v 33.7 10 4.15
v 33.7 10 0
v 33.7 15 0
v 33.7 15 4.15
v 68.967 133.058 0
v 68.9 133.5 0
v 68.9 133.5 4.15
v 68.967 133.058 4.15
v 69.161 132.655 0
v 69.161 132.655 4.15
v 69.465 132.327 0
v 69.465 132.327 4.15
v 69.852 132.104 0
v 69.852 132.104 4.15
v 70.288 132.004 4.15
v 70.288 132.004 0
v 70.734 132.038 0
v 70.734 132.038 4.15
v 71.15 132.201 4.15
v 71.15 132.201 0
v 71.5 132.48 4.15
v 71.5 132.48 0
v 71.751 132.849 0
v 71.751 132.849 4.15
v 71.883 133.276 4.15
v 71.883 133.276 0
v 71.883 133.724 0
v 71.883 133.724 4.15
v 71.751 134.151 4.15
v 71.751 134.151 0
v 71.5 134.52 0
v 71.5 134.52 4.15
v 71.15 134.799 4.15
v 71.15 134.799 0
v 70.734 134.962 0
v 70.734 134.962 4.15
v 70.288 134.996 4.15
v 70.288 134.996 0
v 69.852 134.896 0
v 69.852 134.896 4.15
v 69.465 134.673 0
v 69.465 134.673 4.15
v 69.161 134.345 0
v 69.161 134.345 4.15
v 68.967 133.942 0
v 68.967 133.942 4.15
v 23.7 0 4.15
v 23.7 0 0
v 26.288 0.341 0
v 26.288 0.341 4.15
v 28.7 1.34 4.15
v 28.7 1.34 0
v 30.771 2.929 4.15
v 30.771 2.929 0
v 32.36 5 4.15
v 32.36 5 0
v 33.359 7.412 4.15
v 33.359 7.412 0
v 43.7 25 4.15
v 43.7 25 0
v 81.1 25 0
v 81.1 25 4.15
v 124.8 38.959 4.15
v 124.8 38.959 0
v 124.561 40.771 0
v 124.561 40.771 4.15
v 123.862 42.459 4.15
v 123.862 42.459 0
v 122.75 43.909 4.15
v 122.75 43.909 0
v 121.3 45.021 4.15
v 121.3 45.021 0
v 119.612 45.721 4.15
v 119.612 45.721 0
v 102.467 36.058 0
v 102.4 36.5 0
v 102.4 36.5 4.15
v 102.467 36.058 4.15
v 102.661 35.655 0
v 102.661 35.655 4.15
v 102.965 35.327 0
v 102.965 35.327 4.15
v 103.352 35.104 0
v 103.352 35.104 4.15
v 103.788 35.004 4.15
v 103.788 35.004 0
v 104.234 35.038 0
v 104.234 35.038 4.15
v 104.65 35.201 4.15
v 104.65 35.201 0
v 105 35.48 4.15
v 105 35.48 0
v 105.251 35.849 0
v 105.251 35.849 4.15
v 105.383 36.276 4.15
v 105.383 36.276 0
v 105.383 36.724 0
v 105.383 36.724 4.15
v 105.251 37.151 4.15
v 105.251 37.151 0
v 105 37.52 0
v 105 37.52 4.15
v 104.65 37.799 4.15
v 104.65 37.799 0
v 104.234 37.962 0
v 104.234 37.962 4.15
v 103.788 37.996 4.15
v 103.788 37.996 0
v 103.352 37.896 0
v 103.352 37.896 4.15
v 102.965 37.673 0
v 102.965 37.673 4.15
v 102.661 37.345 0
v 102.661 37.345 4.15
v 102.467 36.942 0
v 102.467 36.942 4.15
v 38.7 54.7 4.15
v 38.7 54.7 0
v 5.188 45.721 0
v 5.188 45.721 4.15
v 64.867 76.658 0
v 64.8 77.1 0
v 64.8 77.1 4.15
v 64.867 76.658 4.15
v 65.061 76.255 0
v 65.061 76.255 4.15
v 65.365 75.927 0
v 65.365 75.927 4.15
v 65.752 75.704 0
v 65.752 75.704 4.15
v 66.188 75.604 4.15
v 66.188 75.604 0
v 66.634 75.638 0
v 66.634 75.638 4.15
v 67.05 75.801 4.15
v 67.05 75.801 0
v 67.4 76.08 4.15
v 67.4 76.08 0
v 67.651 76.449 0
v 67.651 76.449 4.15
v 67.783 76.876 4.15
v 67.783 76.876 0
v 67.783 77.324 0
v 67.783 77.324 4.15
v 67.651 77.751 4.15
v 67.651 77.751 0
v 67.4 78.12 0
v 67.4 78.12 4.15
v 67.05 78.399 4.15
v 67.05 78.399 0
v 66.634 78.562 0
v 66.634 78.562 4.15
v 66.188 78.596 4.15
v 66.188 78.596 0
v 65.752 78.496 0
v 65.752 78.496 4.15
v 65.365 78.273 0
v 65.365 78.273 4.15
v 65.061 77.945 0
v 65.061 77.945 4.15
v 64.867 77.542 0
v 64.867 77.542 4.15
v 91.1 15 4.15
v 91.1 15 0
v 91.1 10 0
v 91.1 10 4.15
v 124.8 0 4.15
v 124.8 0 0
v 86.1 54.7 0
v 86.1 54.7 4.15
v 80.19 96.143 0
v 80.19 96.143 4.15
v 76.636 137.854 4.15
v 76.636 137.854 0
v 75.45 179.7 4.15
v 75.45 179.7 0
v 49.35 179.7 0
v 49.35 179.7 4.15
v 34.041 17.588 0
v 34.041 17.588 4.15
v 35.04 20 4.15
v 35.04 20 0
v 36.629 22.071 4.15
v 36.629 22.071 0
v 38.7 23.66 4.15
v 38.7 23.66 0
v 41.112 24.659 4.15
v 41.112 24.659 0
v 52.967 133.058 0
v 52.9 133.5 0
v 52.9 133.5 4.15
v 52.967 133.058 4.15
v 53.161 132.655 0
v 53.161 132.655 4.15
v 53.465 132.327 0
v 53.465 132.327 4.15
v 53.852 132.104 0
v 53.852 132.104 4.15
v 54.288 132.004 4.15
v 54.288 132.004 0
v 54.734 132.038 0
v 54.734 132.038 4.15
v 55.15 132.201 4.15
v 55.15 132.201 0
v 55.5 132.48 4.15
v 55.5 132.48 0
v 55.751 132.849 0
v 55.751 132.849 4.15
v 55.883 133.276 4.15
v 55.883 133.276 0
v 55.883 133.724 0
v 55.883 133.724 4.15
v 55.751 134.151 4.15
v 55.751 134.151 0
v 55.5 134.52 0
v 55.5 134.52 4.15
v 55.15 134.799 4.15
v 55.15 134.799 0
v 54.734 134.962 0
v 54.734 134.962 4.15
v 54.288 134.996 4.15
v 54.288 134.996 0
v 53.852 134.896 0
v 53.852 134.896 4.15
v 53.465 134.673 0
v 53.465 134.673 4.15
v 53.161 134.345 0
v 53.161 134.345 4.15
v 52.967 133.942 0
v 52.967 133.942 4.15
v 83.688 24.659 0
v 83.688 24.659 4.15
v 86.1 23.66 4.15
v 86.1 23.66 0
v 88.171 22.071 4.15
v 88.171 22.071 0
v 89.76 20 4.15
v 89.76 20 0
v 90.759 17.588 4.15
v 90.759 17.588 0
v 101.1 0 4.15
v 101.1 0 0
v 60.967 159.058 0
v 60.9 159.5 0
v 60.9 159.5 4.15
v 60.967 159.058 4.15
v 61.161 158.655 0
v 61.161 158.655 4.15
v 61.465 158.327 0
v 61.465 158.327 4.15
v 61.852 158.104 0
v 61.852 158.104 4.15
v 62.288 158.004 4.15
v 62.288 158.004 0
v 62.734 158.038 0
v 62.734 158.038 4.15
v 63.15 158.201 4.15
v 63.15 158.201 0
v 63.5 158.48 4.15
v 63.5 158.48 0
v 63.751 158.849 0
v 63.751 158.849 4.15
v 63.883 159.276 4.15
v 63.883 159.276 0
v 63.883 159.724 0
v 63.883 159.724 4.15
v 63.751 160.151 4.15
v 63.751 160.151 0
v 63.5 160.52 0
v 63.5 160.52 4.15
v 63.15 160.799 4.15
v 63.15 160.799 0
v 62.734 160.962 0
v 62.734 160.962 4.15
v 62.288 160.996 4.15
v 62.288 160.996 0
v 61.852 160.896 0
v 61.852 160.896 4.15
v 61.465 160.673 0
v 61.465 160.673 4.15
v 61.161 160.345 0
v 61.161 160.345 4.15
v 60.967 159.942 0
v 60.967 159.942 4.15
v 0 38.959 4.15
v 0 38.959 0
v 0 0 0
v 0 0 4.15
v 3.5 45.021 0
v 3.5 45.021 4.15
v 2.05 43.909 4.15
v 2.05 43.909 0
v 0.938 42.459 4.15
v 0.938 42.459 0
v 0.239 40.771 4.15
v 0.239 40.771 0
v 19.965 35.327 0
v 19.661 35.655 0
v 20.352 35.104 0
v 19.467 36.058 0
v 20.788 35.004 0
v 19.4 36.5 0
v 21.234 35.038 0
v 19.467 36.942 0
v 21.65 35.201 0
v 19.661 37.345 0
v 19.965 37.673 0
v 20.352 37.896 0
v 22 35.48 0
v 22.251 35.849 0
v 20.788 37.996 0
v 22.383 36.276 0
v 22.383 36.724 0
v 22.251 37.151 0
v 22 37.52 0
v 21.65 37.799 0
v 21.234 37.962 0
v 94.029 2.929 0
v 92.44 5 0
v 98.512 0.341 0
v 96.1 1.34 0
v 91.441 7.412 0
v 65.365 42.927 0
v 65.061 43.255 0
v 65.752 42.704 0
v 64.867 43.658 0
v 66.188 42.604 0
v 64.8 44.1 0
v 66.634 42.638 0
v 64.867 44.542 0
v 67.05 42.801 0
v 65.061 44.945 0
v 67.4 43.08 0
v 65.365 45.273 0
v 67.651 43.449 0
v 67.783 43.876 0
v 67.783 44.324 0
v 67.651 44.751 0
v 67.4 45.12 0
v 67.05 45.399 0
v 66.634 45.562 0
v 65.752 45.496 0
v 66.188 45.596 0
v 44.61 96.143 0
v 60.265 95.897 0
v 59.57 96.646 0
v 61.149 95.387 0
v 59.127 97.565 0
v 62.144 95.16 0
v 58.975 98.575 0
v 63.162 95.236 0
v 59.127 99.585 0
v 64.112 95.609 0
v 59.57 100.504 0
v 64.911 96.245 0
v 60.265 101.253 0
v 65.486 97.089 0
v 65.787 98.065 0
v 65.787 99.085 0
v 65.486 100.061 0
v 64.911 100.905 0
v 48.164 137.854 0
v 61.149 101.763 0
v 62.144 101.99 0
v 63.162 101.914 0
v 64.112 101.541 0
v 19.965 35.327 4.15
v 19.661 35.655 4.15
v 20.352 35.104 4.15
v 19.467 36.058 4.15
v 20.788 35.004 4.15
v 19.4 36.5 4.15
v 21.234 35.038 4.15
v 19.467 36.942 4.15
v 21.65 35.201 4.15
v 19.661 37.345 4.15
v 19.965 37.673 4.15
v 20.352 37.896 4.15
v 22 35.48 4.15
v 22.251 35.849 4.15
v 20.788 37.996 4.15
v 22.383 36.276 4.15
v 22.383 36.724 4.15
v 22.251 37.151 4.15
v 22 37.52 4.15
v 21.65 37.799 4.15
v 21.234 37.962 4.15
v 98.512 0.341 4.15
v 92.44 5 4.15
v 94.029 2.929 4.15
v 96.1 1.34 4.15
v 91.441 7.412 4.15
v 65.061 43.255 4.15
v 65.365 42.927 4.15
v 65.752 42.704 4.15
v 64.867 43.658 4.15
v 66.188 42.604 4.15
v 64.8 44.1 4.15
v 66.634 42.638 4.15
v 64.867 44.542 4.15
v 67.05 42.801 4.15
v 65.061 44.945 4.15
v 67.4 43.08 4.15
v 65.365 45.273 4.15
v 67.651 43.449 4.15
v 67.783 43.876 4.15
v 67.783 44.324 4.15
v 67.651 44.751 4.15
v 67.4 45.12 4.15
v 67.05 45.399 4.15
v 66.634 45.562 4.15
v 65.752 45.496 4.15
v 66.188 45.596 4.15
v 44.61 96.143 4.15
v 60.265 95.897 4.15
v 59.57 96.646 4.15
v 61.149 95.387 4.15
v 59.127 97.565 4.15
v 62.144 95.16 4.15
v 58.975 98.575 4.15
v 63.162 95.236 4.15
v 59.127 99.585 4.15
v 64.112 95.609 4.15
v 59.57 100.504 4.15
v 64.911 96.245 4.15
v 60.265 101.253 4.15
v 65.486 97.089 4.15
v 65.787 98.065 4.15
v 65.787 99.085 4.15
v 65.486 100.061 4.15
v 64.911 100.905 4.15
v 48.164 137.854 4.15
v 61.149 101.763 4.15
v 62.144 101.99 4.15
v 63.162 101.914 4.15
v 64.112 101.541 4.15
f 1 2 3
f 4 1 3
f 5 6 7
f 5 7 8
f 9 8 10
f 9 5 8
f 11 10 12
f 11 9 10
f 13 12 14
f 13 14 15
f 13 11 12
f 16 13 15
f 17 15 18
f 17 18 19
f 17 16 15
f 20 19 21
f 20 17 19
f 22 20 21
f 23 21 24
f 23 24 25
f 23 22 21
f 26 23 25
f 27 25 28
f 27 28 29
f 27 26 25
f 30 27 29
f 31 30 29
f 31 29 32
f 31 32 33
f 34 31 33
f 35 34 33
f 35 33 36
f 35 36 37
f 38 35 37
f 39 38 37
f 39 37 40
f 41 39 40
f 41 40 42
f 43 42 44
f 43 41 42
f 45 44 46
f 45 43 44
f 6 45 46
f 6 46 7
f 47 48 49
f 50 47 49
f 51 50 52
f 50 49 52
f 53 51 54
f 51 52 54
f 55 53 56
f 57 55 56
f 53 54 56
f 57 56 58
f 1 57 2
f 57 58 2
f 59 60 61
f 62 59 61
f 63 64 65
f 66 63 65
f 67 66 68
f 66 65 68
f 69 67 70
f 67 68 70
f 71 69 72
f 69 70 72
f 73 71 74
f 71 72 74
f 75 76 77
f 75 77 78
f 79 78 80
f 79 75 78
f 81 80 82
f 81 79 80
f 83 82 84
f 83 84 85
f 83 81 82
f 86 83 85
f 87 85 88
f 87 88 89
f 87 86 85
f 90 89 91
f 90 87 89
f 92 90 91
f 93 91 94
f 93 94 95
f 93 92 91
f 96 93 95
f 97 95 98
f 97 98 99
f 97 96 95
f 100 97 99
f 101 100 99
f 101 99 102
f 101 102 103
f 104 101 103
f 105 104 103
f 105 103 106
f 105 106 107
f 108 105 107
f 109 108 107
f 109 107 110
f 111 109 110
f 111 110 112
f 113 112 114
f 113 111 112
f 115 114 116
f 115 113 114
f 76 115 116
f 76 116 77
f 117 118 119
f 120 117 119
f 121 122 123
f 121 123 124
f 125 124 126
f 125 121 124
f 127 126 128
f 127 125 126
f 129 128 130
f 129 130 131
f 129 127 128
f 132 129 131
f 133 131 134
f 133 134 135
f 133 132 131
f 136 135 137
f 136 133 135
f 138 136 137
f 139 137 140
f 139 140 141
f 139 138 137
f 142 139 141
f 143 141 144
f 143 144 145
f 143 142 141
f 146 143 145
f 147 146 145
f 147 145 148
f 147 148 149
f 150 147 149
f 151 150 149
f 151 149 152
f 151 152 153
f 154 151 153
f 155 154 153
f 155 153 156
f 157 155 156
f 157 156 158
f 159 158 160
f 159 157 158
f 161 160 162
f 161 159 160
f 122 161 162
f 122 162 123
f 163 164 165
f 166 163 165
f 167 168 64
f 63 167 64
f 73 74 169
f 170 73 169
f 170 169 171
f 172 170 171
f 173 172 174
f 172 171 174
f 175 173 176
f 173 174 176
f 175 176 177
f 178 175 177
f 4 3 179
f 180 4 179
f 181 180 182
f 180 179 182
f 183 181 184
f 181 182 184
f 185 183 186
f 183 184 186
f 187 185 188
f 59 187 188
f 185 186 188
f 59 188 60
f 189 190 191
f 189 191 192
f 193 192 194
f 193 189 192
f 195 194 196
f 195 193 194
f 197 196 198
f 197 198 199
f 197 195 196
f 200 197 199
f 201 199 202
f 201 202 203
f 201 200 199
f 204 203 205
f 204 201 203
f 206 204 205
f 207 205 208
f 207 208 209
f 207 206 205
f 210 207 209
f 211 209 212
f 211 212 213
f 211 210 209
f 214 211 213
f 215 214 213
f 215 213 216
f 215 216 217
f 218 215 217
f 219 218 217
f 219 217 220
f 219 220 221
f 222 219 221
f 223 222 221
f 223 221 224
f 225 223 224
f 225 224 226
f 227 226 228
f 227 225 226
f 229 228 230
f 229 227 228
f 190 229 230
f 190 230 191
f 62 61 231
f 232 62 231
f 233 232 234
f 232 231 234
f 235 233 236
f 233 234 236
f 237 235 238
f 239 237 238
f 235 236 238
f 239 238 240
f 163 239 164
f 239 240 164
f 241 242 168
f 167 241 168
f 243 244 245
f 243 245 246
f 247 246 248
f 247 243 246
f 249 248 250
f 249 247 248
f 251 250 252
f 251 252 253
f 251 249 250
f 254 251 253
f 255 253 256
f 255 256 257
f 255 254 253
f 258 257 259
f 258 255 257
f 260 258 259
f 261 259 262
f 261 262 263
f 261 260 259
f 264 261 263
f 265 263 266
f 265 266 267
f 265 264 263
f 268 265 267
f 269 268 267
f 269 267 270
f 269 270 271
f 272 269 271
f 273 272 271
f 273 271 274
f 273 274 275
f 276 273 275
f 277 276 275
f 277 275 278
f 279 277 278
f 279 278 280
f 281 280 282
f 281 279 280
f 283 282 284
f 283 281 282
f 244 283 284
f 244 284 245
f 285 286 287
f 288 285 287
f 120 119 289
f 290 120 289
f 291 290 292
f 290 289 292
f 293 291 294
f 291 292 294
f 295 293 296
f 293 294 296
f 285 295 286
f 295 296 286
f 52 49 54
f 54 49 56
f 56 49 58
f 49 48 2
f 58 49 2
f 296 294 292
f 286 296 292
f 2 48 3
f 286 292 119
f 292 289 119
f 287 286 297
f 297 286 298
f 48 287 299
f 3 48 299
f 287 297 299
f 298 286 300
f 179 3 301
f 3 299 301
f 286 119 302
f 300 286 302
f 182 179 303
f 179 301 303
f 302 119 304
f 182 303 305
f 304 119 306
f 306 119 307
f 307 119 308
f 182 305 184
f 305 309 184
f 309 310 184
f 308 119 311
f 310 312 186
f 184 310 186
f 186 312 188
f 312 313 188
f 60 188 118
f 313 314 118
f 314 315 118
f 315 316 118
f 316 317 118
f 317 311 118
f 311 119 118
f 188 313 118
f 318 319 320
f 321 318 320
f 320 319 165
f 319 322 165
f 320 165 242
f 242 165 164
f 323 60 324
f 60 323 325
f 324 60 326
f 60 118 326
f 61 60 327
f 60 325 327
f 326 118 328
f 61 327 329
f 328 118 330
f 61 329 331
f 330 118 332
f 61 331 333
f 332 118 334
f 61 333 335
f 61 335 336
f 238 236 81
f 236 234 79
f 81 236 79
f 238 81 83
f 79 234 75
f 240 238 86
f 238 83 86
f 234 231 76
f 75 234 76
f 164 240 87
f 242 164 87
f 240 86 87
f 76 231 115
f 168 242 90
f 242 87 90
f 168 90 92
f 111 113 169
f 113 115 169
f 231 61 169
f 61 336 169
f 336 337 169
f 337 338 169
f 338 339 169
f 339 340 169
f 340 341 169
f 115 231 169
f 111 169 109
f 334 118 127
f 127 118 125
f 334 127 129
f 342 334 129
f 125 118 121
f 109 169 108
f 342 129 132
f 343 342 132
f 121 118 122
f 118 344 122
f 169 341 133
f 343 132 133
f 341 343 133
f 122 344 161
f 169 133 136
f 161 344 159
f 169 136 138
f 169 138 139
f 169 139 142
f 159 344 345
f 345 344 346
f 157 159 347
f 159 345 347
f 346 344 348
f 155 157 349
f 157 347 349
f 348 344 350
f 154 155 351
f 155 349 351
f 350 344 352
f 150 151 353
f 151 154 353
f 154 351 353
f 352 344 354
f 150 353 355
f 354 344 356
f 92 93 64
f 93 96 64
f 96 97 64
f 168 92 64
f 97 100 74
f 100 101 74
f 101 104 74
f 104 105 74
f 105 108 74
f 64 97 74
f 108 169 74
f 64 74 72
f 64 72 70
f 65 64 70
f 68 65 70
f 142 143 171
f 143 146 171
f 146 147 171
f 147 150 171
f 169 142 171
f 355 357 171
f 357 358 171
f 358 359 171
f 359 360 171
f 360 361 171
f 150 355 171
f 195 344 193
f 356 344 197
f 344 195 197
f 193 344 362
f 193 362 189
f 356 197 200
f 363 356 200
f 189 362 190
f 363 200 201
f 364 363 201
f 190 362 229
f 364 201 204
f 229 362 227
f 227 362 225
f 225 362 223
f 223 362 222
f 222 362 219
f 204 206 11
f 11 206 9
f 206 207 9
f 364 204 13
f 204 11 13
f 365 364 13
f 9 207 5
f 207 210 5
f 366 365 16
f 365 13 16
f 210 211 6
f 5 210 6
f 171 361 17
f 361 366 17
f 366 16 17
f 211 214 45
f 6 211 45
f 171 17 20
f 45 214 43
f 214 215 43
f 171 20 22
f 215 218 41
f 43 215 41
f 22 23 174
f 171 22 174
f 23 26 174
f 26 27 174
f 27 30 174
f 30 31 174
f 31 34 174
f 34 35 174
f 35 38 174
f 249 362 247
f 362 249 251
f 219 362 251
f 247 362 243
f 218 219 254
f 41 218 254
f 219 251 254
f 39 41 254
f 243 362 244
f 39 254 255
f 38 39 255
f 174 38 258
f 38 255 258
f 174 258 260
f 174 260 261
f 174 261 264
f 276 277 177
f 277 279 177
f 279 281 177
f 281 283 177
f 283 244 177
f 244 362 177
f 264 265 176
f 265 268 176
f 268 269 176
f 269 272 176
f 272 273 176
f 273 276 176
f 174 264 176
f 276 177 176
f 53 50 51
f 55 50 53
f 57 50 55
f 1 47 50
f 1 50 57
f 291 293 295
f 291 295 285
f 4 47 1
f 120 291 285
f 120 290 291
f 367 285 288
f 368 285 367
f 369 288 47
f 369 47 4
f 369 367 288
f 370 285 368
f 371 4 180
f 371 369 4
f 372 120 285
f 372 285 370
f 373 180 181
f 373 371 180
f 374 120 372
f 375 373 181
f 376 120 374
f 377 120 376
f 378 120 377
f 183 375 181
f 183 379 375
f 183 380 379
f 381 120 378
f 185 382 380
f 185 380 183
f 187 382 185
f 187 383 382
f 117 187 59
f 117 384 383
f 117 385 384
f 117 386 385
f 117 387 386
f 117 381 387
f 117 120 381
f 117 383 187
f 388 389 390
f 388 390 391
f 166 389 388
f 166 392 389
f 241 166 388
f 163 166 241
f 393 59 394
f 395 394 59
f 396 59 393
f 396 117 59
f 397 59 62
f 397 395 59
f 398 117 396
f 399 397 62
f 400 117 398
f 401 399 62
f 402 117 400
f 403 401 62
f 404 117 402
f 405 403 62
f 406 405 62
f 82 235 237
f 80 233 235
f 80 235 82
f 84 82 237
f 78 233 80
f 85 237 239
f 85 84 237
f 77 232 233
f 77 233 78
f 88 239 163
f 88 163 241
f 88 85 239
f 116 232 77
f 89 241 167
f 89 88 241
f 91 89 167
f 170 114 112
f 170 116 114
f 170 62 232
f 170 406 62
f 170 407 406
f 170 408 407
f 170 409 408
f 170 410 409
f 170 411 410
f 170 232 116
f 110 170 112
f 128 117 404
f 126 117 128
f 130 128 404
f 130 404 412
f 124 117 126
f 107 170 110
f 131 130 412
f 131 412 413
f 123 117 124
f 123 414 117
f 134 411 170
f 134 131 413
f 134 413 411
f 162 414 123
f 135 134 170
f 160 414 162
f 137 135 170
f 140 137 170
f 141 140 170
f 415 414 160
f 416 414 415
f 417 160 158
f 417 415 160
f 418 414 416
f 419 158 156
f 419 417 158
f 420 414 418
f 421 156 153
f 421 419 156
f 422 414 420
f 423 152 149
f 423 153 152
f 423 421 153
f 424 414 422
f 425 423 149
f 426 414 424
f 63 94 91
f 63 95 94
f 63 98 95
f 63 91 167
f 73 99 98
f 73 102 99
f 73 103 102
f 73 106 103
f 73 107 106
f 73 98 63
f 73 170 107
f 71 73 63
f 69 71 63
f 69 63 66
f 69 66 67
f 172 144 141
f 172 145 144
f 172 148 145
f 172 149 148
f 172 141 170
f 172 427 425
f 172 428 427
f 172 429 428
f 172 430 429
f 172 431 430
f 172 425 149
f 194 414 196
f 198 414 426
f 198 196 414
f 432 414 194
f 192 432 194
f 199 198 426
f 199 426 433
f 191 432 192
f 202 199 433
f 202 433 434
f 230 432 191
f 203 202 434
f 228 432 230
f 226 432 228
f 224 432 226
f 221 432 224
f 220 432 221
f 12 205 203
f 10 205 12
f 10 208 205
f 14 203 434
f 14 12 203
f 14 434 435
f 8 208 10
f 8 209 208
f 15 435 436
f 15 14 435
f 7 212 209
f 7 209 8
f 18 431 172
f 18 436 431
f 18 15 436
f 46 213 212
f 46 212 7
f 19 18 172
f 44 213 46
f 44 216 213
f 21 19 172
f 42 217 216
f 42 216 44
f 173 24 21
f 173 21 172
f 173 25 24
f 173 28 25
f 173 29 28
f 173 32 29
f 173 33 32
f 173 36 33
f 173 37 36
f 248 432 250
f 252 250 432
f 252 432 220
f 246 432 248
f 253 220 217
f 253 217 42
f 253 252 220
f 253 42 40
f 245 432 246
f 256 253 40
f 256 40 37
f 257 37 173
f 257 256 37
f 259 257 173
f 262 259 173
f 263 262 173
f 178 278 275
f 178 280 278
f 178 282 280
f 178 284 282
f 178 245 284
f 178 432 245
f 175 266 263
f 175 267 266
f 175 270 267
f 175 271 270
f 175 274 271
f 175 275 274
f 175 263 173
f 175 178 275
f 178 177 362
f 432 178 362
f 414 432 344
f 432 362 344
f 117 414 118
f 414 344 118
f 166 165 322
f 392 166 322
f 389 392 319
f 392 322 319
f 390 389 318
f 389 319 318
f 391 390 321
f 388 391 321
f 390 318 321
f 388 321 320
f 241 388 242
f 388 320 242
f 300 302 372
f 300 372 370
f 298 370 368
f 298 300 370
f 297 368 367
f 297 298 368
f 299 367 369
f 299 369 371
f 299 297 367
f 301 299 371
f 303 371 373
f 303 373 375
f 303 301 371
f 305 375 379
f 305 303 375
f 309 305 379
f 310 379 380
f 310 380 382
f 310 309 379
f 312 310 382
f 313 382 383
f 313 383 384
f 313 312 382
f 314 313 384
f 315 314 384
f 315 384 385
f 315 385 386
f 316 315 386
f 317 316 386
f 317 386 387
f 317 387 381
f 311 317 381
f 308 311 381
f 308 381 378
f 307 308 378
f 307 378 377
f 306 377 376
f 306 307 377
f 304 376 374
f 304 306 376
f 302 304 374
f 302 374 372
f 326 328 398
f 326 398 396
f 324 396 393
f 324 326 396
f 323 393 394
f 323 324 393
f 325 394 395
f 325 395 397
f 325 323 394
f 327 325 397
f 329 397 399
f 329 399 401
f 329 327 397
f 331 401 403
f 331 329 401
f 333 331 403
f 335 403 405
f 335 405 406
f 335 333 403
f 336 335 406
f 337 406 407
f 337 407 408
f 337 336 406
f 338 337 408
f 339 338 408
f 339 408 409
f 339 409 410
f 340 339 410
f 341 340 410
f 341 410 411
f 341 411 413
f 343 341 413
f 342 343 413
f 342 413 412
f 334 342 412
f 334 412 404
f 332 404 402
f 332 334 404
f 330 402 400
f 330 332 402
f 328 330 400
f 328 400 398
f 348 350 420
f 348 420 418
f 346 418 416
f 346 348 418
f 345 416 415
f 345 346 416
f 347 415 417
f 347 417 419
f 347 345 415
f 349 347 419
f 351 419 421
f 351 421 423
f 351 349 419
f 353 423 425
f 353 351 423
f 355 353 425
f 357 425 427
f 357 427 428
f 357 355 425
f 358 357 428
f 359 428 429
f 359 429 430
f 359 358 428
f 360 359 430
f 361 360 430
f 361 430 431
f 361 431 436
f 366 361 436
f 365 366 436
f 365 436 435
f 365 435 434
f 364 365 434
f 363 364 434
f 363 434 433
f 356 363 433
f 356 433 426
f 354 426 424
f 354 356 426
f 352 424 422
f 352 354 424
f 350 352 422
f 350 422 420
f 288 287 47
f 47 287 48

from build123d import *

# Parameters (mm, degrees)
ESBO_O2_R                = 1.5
ESBO_O2_R_2              = 3.425
RESSALTO_EXTRUS_O1_DEPTH = 4.15


with BuildPart() as part:
    # Esboço2 → Ressalto-extrusão1 (new body)
    with BuildSketch(Plane.XY):
        with BuildLine():
            Line((0, 0), (23.7, 0))
            ThreePointArc((23.7, 0), (30.771067812, 2.928932188), (33.7, 10))
            Line((33.7, 10), (33.7, 15))
            ThreePointArc((33.7, 15), (36.628932188, 22.071067812), (43.7, 25))
            Line((43.7, 25), (81.1, 25))
            ThreePointArc((81.1, 25), (88.171067812, 22.071067812), (91.1, 15))
            Line((91.1, 15), (91.1, 10))
            ThreePointArc((91.1, 10), (94.028932188, 2.928932188), (101.1, 0))
            Line((101.1, 0), (124.8, 0))
            Line((124.8, 0), (124.8, 38.959077337))
            ThreePointArc((124.8, 38.959077337), (123.353473382, 43.22040734), (119.611733316, 45.720558121))
            Line((119.611733316, 45.720558121), (86.1, 54.7))
            ThreePointArc((86.1, 54.7), (78.117314341, 116.973565182), (75.45, 179.7))
            Line((75.45, 179.7), (49.35, 179.7))
            ThreePointArc((49.35, 179.7), (46.682685659, 116.973565182), (38.7, 54.7))
            Line((38.7, 54.7), (5.188266684, 45.720558121))
            ThreePointArc((5.188266684, 45.720558121), (1.446526618, 43.22040734), (0, 38.959077337))
            Line((0, 38.959077337), (0, 0))
        make_face()
        with Locations(Location((62.4, 159.5, 0), (0, 0, 180))):
            Circle(ESBO_O2_R, mode=Mode.SUBTRACT)
        with Locations(Location((54.4, 133.5, 0), (0, 0, 180))):
            Circle(ESBO_O2_R, mode=Mode.SUBTRACT)
        with Locations(Location((70.4, 133.5, 0), (0, 0, 180))):
            Circle(ESBO_O2_R, mode=Mode.SUBTRACT)
        with Locations(Location((62.4, 98.575, 0), (0, 0, 180))):
            Circle(ESBO_O2_R_2, mode=Mode.SUBTRACT)
        with Locations(Location((66.3, 77.1, 0), (0, 0, 180))):
            Circle(ESBO_O2_R, mode=Mode.SUBTRACT)
        with Locations(Location((66.3, 44.1, 0), (0, 0, 180))):
            Circle(ESBO_O2_R, mode=Mode.SUBTRACT)
        with Locations(Location((103.9, 36.5, 0), (0, 0, 180))):
            Circle(ESBO_O2_R, mode=Mode.SUBTRACT)
        with Locations(Location((20.9, 36.5, 0), (0, 0, 180))):
            Circle(ESBO_O2_R, mode=Mode.SUBTRACT)
    extrude(amount=RESSALTO_EXTRUS_O1_DEPTH)


solid = part.part
